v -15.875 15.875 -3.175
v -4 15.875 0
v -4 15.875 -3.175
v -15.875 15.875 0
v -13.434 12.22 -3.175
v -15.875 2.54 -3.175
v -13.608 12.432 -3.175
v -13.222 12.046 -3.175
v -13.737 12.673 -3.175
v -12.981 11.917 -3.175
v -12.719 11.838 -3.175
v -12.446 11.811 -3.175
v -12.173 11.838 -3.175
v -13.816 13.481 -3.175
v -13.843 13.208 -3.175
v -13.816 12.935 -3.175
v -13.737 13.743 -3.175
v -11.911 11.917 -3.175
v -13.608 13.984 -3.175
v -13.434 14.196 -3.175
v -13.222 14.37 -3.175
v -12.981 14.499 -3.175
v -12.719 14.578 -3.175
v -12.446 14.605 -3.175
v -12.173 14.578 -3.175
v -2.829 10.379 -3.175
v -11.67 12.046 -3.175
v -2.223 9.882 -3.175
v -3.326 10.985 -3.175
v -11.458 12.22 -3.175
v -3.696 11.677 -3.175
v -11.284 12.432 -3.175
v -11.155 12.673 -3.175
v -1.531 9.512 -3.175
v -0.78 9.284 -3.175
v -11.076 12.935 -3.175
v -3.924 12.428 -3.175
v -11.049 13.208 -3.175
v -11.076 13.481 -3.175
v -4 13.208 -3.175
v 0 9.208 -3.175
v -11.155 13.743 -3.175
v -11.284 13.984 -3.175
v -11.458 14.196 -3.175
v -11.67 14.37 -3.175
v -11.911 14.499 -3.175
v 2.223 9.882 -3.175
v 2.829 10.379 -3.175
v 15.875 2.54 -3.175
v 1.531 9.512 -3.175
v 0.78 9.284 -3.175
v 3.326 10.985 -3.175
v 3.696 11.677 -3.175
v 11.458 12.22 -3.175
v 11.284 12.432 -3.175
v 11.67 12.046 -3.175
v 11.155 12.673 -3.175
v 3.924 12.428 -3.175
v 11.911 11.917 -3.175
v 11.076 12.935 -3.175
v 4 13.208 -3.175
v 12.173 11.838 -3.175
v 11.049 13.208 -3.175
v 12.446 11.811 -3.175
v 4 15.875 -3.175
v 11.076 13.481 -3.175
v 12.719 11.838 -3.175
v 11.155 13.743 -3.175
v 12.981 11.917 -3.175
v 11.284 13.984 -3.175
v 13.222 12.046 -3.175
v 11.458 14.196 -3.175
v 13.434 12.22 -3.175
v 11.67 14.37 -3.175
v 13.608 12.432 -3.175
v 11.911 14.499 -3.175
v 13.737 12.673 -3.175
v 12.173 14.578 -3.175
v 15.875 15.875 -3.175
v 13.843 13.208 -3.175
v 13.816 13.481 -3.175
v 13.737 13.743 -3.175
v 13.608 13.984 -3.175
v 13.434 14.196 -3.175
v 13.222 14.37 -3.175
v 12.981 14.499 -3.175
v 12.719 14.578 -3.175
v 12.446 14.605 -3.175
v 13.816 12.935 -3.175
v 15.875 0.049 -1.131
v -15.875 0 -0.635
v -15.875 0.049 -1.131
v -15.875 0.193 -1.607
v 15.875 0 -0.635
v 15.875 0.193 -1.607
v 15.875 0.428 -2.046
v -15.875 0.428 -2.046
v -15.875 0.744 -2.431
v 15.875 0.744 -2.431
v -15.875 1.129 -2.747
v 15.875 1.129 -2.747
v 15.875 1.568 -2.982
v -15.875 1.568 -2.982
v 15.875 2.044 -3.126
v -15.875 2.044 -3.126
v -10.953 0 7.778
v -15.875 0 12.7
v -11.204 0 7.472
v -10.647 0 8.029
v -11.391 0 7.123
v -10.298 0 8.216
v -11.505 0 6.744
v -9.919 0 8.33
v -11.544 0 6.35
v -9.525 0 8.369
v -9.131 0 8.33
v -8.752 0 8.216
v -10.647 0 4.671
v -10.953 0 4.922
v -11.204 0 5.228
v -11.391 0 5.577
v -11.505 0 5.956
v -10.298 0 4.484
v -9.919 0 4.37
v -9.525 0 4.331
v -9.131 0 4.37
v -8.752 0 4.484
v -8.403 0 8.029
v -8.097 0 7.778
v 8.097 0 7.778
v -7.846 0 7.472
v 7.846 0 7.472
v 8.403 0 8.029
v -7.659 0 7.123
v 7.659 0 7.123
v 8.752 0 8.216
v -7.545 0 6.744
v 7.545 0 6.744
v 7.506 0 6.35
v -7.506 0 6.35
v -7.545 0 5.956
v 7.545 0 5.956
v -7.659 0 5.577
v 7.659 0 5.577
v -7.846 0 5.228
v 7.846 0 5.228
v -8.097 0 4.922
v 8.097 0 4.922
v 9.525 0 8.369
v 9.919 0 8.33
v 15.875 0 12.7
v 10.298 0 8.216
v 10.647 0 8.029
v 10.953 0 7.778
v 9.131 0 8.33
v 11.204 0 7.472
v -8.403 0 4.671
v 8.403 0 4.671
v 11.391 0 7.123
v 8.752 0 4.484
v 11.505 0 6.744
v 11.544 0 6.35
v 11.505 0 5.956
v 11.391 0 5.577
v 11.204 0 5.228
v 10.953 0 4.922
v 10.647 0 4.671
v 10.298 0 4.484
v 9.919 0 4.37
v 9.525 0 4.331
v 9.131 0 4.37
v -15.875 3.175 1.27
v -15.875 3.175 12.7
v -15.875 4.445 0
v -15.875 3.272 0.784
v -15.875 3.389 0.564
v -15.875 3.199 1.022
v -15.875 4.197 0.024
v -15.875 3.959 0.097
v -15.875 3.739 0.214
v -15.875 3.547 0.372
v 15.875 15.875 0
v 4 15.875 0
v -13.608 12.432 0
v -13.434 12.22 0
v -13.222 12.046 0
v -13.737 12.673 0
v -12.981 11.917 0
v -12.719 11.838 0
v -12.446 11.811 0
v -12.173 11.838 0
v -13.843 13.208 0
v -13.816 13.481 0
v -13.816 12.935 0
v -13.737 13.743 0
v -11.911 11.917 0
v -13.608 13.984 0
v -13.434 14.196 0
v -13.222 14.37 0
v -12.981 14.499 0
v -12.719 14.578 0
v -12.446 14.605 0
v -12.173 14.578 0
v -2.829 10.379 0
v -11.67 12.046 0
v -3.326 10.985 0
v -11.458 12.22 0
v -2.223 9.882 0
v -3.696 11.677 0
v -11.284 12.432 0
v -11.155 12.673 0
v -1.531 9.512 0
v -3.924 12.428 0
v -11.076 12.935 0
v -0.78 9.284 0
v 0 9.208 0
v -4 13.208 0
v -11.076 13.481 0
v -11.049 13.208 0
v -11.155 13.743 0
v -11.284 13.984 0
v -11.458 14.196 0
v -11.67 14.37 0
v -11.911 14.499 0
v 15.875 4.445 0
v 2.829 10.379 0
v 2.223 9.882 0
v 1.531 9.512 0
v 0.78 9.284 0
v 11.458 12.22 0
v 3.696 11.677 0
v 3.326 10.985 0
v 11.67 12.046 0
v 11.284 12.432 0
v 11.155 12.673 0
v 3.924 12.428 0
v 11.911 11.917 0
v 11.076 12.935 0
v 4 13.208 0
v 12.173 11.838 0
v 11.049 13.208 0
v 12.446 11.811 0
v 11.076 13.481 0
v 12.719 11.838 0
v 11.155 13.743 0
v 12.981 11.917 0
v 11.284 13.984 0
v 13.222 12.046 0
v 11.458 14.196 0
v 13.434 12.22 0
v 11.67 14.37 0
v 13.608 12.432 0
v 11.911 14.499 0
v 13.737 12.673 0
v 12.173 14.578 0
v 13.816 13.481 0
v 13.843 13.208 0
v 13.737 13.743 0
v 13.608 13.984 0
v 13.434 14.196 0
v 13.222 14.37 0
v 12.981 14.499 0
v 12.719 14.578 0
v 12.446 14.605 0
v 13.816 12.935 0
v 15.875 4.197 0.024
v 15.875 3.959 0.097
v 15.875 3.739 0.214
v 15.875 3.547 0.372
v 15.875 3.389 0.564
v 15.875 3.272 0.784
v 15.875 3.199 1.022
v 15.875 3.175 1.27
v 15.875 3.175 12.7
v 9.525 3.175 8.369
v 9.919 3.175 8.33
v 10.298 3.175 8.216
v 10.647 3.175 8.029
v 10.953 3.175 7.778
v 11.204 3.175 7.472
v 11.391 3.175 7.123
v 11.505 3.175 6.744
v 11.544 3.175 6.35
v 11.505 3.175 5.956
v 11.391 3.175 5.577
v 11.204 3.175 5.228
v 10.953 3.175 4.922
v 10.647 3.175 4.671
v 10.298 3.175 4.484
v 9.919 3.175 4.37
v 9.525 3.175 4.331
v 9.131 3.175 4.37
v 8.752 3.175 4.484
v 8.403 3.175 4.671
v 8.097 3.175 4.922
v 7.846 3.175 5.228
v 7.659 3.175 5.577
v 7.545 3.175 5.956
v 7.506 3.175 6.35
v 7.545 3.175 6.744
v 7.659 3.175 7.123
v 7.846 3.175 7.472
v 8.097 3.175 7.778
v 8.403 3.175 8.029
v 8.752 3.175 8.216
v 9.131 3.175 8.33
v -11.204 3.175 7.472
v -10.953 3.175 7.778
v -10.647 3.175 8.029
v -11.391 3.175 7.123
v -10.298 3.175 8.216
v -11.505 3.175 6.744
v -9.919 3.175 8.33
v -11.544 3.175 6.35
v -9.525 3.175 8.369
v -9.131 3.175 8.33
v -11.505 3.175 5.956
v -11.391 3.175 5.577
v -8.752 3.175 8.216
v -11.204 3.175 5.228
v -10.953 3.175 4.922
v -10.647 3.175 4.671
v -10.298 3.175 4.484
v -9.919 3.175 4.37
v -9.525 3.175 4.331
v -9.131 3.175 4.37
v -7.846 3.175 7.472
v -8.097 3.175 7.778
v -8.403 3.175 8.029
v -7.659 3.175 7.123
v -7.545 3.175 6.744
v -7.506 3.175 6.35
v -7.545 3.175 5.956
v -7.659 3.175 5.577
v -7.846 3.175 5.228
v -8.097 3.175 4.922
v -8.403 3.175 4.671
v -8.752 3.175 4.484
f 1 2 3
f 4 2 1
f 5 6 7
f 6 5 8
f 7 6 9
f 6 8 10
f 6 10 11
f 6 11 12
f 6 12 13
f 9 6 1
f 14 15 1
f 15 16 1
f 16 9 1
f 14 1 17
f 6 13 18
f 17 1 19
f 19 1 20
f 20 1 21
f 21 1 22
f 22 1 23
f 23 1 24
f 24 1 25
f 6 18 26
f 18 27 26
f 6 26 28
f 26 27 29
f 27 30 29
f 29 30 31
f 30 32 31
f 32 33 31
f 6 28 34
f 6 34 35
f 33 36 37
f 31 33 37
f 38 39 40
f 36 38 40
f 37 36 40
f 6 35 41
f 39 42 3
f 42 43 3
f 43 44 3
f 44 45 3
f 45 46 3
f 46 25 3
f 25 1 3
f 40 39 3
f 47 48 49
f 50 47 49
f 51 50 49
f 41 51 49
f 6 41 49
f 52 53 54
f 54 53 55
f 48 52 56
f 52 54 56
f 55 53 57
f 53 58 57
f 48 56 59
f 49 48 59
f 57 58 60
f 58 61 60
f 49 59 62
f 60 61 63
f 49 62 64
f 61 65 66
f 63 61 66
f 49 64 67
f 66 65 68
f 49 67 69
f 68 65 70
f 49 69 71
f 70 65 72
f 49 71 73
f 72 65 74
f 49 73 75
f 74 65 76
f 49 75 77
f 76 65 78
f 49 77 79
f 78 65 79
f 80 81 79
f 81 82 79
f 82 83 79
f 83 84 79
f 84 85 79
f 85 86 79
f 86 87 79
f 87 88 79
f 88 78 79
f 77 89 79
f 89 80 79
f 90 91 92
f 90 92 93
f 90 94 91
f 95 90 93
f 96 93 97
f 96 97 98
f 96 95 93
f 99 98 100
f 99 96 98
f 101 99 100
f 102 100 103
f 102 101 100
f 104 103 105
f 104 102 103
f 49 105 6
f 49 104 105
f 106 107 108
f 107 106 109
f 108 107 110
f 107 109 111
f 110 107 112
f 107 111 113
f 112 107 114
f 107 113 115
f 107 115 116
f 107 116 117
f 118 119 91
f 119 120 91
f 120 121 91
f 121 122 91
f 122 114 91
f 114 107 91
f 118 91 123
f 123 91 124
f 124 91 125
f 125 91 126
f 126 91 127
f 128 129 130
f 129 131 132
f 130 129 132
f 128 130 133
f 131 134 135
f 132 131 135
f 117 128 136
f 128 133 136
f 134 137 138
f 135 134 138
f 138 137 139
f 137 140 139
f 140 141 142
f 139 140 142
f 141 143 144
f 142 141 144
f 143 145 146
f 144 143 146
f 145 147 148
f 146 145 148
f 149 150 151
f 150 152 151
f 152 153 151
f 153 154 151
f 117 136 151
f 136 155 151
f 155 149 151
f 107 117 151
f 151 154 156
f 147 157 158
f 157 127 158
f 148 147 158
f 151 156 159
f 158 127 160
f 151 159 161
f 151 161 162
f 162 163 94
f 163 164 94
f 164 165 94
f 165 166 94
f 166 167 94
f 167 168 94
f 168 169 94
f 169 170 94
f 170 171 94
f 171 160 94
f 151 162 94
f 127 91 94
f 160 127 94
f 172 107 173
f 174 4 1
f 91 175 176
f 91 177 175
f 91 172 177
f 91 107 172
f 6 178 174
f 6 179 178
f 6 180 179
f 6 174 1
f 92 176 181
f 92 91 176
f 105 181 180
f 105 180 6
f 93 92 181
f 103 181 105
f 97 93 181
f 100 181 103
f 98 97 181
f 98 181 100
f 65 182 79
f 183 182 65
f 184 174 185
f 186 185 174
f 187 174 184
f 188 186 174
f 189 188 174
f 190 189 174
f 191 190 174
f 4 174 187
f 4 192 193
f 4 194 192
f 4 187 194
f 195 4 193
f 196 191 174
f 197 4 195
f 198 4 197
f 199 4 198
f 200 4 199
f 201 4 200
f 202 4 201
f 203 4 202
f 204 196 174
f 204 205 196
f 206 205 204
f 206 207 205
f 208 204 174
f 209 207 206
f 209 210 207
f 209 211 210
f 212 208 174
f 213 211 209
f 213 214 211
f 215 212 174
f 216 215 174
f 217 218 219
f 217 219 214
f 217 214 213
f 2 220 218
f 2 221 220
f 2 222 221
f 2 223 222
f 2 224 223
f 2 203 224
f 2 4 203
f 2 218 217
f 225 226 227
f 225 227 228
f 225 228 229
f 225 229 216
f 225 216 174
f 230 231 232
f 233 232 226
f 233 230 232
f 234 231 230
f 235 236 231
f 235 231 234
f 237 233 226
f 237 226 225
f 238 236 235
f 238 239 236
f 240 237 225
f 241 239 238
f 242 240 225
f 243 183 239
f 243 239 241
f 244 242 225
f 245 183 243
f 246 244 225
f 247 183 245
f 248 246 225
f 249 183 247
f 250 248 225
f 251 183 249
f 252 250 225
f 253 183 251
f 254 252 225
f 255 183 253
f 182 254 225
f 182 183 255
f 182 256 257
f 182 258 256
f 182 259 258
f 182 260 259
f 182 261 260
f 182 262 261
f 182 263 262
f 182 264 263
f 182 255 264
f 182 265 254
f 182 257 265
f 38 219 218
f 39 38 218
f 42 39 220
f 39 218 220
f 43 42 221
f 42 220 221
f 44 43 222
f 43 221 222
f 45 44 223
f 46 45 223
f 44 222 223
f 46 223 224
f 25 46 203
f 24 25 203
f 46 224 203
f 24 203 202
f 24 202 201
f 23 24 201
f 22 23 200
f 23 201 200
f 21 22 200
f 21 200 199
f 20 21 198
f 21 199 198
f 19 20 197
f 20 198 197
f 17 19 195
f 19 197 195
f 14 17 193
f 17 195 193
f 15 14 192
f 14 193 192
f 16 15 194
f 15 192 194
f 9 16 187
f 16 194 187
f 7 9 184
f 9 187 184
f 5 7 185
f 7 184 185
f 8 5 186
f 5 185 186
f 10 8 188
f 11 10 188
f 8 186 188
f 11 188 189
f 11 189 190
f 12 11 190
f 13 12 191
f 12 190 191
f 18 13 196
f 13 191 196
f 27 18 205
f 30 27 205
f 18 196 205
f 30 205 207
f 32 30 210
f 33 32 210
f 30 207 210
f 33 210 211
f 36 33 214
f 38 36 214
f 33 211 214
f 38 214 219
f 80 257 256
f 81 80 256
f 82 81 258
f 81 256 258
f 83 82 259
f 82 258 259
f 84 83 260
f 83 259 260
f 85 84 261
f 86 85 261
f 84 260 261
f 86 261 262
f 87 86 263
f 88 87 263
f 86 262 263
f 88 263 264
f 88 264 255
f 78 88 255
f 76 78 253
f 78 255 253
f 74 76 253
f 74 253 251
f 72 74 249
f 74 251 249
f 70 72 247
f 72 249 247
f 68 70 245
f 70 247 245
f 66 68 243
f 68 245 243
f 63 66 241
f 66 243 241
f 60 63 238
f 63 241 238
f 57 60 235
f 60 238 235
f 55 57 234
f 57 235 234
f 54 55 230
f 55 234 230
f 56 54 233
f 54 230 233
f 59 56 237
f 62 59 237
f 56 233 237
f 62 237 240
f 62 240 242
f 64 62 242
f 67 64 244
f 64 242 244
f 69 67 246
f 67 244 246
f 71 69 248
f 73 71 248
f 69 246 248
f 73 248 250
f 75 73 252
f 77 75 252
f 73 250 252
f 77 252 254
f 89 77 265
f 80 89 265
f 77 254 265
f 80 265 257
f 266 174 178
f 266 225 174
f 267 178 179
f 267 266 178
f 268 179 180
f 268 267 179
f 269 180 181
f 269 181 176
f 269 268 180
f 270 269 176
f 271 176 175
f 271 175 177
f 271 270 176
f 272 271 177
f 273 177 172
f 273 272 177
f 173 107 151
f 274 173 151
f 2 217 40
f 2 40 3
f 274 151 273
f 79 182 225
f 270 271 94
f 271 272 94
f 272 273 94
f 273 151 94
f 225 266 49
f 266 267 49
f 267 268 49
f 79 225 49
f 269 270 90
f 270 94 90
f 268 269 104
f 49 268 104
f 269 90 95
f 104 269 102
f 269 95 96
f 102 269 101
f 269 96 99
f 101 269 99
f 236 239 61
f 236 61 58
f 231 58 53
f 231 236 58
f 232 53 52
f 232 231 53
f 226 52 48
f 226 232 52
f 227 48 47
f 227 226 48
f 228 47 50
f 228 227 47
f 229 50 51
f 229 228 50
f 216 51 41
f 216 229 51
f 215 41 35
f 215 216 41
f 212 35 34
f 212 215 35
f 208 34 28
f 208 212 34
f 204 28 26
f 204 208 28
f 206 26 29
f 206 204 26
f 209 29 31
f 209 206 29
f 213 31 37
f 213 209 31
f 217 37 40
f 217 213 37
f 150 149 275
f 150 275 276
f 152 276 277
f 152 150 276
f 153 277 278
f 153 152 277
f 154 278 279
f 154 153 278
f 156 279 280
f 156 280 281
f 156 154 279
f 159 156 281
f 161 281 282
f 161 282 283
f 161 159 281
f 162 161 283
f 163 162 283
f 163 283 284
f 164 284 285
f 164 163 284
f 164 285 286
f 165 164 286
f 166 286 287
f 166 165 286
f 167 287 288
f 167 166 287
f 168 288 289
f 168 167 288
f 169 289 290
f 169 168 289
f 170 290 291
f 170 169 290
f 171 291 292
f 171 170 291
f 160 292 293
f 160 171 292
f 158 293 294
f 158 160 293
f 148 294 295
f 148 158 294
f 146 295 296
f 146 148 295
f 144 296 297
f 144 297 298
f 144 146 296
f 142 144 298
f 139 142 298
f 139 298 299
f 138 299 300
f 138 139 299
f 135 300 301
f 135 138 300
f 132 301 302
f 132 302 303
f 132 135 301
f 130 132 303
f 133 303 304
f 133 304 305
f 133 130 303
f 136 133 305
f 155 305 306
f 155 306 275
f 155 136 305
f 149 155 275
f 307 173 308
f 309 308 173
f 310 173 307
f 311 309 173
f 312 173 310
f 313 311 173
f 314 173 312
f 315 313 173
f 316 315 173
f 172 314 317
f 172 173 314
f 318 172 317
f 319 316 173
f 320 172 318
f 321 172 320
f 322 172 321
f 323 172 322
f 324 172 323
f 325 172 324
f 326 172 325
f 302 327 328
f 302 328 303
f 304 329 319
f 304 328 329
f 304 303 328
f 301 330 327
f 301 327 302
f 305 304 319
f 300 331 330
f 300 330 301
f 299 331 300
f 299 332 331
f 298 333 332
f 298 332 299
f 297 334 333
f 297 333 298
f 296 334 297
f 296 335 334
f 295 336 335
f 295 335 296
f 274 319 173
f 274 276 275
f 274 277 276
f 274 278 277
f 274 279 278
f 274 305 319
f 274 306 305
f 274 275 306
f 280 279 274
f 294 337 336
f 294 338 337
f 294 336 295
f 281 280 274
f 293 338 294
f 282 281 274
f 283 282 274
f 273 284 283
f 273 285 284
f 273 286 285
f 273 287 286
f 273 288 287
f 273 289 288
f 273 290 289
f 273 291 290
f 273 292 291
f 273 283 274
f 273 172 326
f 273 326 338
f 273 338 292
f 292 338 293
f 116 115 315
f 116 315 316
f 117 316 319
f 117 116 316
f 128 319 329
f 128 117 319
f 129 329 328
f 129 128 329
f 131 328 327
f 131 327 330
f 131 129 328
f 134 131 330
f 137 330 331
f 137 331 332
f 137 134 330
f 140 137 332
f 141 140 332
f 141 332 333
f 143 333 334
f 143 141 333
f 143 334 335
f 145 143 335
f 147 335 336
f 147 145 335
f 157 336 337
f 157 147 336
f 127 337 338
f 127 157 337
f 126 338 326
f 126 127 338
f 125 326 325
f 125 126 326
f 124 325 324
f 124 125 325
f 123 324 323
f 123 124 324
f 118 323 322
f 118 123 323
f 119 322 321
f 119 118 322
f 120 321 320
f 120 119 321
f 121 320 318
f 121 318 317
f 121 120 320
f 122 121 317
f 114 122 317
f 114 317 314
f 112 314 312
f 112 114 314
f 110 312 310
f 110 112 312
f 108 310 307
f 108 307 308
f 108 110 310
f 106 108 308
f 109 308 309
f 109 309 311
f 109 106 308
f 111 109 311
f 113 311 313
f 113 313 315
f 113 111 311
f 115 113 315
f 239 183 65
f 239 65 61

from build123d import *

# Parameters (mm, degrees)
SKETCH1_R           = 1.397
BOSS_EXTRUDE1_DEPTH = 3.175
SKETCH2_W           = 31.75
SKETCH2_H           = 12.7
SKETCH2_R           = 2.0193
BOSS_EXTRUDE2_DEPTH = 3.175
FILLET1_R           = 1.27
FILLET2_R           = 2.54


with BuildPart() as part:
    # Sketch1 → Boss-Extrude1 (new body)
    with BuildSketch(Plane.XY):
        with BuildLine():
            Line((-4.0005, 13.208), (-4.0005, 15.875))
            Line((-4.0005, 15.875), (-15.875, 15.875))
            Line((-15.875, 15.875), (-15.875, 0))
            Line((-15.875, 0), (15.875, 0))
            Line((15.875, 0), (15.875, 15.875))
            Line((15.875, 15.875), (4.0005, 15.875))
            Line((4.0005, 15.875), (4.0005, 13.208))
            ThreePointArc((4.0005, 13.208), (0, 9.2075), (-4.0005, 13.208))
        make_face()
        with Locations((12.446, 13.208)):
            Circle(SKETCH1_R, mode=Mode.SUBTRACT)
        with Locations((-12.446, 13.208)):
            Circle(SKETCH1_R, mode=Mode.SUBTRACT)
    extrude(amount=-BOSS_EXTRUDE1_DEPTH)

    # Sketch2 → Boss-Extrude2 (add)
    with BuildSketch(Plane(origin=(0, 0, 0), x_dir=(1, 0, 0), z_dir=(0, 1, 0))):
        with Locations((0, -6.35)):
            Rectangle(SKETCH2_W, SKETCH2_H)
        with Locations(Location((-9.525, -6.35, 0), (0, 0, 270))):
            Circle(SKETCH2_R, mode=Mode.SUBTRACT)
        with Locations(Location((9.525, -6.35, 0), (0, 0, 270))):
            Circle(SKETCH2_R, mode=Mode.SUBTRACT)
    extrude(amount=BOSS_EXTRUDE2_DEPTH)

    # Fillet1
    fillet1_edges = [part.edges().sort_by_distance(p)[0] for p in [
        (0, 3.175, 0),
    ]]
    fillet(fillet1_edges, radius=FILLET1_R)

    # Fillet2
    fillet2_edges = [part.edges().sort_by_distance(p)[0] for p in [
        (0, 0, -3.175),
    ]]
    fillet(fillet2_edges, radius=FILLET2_R)


solid = part.part
